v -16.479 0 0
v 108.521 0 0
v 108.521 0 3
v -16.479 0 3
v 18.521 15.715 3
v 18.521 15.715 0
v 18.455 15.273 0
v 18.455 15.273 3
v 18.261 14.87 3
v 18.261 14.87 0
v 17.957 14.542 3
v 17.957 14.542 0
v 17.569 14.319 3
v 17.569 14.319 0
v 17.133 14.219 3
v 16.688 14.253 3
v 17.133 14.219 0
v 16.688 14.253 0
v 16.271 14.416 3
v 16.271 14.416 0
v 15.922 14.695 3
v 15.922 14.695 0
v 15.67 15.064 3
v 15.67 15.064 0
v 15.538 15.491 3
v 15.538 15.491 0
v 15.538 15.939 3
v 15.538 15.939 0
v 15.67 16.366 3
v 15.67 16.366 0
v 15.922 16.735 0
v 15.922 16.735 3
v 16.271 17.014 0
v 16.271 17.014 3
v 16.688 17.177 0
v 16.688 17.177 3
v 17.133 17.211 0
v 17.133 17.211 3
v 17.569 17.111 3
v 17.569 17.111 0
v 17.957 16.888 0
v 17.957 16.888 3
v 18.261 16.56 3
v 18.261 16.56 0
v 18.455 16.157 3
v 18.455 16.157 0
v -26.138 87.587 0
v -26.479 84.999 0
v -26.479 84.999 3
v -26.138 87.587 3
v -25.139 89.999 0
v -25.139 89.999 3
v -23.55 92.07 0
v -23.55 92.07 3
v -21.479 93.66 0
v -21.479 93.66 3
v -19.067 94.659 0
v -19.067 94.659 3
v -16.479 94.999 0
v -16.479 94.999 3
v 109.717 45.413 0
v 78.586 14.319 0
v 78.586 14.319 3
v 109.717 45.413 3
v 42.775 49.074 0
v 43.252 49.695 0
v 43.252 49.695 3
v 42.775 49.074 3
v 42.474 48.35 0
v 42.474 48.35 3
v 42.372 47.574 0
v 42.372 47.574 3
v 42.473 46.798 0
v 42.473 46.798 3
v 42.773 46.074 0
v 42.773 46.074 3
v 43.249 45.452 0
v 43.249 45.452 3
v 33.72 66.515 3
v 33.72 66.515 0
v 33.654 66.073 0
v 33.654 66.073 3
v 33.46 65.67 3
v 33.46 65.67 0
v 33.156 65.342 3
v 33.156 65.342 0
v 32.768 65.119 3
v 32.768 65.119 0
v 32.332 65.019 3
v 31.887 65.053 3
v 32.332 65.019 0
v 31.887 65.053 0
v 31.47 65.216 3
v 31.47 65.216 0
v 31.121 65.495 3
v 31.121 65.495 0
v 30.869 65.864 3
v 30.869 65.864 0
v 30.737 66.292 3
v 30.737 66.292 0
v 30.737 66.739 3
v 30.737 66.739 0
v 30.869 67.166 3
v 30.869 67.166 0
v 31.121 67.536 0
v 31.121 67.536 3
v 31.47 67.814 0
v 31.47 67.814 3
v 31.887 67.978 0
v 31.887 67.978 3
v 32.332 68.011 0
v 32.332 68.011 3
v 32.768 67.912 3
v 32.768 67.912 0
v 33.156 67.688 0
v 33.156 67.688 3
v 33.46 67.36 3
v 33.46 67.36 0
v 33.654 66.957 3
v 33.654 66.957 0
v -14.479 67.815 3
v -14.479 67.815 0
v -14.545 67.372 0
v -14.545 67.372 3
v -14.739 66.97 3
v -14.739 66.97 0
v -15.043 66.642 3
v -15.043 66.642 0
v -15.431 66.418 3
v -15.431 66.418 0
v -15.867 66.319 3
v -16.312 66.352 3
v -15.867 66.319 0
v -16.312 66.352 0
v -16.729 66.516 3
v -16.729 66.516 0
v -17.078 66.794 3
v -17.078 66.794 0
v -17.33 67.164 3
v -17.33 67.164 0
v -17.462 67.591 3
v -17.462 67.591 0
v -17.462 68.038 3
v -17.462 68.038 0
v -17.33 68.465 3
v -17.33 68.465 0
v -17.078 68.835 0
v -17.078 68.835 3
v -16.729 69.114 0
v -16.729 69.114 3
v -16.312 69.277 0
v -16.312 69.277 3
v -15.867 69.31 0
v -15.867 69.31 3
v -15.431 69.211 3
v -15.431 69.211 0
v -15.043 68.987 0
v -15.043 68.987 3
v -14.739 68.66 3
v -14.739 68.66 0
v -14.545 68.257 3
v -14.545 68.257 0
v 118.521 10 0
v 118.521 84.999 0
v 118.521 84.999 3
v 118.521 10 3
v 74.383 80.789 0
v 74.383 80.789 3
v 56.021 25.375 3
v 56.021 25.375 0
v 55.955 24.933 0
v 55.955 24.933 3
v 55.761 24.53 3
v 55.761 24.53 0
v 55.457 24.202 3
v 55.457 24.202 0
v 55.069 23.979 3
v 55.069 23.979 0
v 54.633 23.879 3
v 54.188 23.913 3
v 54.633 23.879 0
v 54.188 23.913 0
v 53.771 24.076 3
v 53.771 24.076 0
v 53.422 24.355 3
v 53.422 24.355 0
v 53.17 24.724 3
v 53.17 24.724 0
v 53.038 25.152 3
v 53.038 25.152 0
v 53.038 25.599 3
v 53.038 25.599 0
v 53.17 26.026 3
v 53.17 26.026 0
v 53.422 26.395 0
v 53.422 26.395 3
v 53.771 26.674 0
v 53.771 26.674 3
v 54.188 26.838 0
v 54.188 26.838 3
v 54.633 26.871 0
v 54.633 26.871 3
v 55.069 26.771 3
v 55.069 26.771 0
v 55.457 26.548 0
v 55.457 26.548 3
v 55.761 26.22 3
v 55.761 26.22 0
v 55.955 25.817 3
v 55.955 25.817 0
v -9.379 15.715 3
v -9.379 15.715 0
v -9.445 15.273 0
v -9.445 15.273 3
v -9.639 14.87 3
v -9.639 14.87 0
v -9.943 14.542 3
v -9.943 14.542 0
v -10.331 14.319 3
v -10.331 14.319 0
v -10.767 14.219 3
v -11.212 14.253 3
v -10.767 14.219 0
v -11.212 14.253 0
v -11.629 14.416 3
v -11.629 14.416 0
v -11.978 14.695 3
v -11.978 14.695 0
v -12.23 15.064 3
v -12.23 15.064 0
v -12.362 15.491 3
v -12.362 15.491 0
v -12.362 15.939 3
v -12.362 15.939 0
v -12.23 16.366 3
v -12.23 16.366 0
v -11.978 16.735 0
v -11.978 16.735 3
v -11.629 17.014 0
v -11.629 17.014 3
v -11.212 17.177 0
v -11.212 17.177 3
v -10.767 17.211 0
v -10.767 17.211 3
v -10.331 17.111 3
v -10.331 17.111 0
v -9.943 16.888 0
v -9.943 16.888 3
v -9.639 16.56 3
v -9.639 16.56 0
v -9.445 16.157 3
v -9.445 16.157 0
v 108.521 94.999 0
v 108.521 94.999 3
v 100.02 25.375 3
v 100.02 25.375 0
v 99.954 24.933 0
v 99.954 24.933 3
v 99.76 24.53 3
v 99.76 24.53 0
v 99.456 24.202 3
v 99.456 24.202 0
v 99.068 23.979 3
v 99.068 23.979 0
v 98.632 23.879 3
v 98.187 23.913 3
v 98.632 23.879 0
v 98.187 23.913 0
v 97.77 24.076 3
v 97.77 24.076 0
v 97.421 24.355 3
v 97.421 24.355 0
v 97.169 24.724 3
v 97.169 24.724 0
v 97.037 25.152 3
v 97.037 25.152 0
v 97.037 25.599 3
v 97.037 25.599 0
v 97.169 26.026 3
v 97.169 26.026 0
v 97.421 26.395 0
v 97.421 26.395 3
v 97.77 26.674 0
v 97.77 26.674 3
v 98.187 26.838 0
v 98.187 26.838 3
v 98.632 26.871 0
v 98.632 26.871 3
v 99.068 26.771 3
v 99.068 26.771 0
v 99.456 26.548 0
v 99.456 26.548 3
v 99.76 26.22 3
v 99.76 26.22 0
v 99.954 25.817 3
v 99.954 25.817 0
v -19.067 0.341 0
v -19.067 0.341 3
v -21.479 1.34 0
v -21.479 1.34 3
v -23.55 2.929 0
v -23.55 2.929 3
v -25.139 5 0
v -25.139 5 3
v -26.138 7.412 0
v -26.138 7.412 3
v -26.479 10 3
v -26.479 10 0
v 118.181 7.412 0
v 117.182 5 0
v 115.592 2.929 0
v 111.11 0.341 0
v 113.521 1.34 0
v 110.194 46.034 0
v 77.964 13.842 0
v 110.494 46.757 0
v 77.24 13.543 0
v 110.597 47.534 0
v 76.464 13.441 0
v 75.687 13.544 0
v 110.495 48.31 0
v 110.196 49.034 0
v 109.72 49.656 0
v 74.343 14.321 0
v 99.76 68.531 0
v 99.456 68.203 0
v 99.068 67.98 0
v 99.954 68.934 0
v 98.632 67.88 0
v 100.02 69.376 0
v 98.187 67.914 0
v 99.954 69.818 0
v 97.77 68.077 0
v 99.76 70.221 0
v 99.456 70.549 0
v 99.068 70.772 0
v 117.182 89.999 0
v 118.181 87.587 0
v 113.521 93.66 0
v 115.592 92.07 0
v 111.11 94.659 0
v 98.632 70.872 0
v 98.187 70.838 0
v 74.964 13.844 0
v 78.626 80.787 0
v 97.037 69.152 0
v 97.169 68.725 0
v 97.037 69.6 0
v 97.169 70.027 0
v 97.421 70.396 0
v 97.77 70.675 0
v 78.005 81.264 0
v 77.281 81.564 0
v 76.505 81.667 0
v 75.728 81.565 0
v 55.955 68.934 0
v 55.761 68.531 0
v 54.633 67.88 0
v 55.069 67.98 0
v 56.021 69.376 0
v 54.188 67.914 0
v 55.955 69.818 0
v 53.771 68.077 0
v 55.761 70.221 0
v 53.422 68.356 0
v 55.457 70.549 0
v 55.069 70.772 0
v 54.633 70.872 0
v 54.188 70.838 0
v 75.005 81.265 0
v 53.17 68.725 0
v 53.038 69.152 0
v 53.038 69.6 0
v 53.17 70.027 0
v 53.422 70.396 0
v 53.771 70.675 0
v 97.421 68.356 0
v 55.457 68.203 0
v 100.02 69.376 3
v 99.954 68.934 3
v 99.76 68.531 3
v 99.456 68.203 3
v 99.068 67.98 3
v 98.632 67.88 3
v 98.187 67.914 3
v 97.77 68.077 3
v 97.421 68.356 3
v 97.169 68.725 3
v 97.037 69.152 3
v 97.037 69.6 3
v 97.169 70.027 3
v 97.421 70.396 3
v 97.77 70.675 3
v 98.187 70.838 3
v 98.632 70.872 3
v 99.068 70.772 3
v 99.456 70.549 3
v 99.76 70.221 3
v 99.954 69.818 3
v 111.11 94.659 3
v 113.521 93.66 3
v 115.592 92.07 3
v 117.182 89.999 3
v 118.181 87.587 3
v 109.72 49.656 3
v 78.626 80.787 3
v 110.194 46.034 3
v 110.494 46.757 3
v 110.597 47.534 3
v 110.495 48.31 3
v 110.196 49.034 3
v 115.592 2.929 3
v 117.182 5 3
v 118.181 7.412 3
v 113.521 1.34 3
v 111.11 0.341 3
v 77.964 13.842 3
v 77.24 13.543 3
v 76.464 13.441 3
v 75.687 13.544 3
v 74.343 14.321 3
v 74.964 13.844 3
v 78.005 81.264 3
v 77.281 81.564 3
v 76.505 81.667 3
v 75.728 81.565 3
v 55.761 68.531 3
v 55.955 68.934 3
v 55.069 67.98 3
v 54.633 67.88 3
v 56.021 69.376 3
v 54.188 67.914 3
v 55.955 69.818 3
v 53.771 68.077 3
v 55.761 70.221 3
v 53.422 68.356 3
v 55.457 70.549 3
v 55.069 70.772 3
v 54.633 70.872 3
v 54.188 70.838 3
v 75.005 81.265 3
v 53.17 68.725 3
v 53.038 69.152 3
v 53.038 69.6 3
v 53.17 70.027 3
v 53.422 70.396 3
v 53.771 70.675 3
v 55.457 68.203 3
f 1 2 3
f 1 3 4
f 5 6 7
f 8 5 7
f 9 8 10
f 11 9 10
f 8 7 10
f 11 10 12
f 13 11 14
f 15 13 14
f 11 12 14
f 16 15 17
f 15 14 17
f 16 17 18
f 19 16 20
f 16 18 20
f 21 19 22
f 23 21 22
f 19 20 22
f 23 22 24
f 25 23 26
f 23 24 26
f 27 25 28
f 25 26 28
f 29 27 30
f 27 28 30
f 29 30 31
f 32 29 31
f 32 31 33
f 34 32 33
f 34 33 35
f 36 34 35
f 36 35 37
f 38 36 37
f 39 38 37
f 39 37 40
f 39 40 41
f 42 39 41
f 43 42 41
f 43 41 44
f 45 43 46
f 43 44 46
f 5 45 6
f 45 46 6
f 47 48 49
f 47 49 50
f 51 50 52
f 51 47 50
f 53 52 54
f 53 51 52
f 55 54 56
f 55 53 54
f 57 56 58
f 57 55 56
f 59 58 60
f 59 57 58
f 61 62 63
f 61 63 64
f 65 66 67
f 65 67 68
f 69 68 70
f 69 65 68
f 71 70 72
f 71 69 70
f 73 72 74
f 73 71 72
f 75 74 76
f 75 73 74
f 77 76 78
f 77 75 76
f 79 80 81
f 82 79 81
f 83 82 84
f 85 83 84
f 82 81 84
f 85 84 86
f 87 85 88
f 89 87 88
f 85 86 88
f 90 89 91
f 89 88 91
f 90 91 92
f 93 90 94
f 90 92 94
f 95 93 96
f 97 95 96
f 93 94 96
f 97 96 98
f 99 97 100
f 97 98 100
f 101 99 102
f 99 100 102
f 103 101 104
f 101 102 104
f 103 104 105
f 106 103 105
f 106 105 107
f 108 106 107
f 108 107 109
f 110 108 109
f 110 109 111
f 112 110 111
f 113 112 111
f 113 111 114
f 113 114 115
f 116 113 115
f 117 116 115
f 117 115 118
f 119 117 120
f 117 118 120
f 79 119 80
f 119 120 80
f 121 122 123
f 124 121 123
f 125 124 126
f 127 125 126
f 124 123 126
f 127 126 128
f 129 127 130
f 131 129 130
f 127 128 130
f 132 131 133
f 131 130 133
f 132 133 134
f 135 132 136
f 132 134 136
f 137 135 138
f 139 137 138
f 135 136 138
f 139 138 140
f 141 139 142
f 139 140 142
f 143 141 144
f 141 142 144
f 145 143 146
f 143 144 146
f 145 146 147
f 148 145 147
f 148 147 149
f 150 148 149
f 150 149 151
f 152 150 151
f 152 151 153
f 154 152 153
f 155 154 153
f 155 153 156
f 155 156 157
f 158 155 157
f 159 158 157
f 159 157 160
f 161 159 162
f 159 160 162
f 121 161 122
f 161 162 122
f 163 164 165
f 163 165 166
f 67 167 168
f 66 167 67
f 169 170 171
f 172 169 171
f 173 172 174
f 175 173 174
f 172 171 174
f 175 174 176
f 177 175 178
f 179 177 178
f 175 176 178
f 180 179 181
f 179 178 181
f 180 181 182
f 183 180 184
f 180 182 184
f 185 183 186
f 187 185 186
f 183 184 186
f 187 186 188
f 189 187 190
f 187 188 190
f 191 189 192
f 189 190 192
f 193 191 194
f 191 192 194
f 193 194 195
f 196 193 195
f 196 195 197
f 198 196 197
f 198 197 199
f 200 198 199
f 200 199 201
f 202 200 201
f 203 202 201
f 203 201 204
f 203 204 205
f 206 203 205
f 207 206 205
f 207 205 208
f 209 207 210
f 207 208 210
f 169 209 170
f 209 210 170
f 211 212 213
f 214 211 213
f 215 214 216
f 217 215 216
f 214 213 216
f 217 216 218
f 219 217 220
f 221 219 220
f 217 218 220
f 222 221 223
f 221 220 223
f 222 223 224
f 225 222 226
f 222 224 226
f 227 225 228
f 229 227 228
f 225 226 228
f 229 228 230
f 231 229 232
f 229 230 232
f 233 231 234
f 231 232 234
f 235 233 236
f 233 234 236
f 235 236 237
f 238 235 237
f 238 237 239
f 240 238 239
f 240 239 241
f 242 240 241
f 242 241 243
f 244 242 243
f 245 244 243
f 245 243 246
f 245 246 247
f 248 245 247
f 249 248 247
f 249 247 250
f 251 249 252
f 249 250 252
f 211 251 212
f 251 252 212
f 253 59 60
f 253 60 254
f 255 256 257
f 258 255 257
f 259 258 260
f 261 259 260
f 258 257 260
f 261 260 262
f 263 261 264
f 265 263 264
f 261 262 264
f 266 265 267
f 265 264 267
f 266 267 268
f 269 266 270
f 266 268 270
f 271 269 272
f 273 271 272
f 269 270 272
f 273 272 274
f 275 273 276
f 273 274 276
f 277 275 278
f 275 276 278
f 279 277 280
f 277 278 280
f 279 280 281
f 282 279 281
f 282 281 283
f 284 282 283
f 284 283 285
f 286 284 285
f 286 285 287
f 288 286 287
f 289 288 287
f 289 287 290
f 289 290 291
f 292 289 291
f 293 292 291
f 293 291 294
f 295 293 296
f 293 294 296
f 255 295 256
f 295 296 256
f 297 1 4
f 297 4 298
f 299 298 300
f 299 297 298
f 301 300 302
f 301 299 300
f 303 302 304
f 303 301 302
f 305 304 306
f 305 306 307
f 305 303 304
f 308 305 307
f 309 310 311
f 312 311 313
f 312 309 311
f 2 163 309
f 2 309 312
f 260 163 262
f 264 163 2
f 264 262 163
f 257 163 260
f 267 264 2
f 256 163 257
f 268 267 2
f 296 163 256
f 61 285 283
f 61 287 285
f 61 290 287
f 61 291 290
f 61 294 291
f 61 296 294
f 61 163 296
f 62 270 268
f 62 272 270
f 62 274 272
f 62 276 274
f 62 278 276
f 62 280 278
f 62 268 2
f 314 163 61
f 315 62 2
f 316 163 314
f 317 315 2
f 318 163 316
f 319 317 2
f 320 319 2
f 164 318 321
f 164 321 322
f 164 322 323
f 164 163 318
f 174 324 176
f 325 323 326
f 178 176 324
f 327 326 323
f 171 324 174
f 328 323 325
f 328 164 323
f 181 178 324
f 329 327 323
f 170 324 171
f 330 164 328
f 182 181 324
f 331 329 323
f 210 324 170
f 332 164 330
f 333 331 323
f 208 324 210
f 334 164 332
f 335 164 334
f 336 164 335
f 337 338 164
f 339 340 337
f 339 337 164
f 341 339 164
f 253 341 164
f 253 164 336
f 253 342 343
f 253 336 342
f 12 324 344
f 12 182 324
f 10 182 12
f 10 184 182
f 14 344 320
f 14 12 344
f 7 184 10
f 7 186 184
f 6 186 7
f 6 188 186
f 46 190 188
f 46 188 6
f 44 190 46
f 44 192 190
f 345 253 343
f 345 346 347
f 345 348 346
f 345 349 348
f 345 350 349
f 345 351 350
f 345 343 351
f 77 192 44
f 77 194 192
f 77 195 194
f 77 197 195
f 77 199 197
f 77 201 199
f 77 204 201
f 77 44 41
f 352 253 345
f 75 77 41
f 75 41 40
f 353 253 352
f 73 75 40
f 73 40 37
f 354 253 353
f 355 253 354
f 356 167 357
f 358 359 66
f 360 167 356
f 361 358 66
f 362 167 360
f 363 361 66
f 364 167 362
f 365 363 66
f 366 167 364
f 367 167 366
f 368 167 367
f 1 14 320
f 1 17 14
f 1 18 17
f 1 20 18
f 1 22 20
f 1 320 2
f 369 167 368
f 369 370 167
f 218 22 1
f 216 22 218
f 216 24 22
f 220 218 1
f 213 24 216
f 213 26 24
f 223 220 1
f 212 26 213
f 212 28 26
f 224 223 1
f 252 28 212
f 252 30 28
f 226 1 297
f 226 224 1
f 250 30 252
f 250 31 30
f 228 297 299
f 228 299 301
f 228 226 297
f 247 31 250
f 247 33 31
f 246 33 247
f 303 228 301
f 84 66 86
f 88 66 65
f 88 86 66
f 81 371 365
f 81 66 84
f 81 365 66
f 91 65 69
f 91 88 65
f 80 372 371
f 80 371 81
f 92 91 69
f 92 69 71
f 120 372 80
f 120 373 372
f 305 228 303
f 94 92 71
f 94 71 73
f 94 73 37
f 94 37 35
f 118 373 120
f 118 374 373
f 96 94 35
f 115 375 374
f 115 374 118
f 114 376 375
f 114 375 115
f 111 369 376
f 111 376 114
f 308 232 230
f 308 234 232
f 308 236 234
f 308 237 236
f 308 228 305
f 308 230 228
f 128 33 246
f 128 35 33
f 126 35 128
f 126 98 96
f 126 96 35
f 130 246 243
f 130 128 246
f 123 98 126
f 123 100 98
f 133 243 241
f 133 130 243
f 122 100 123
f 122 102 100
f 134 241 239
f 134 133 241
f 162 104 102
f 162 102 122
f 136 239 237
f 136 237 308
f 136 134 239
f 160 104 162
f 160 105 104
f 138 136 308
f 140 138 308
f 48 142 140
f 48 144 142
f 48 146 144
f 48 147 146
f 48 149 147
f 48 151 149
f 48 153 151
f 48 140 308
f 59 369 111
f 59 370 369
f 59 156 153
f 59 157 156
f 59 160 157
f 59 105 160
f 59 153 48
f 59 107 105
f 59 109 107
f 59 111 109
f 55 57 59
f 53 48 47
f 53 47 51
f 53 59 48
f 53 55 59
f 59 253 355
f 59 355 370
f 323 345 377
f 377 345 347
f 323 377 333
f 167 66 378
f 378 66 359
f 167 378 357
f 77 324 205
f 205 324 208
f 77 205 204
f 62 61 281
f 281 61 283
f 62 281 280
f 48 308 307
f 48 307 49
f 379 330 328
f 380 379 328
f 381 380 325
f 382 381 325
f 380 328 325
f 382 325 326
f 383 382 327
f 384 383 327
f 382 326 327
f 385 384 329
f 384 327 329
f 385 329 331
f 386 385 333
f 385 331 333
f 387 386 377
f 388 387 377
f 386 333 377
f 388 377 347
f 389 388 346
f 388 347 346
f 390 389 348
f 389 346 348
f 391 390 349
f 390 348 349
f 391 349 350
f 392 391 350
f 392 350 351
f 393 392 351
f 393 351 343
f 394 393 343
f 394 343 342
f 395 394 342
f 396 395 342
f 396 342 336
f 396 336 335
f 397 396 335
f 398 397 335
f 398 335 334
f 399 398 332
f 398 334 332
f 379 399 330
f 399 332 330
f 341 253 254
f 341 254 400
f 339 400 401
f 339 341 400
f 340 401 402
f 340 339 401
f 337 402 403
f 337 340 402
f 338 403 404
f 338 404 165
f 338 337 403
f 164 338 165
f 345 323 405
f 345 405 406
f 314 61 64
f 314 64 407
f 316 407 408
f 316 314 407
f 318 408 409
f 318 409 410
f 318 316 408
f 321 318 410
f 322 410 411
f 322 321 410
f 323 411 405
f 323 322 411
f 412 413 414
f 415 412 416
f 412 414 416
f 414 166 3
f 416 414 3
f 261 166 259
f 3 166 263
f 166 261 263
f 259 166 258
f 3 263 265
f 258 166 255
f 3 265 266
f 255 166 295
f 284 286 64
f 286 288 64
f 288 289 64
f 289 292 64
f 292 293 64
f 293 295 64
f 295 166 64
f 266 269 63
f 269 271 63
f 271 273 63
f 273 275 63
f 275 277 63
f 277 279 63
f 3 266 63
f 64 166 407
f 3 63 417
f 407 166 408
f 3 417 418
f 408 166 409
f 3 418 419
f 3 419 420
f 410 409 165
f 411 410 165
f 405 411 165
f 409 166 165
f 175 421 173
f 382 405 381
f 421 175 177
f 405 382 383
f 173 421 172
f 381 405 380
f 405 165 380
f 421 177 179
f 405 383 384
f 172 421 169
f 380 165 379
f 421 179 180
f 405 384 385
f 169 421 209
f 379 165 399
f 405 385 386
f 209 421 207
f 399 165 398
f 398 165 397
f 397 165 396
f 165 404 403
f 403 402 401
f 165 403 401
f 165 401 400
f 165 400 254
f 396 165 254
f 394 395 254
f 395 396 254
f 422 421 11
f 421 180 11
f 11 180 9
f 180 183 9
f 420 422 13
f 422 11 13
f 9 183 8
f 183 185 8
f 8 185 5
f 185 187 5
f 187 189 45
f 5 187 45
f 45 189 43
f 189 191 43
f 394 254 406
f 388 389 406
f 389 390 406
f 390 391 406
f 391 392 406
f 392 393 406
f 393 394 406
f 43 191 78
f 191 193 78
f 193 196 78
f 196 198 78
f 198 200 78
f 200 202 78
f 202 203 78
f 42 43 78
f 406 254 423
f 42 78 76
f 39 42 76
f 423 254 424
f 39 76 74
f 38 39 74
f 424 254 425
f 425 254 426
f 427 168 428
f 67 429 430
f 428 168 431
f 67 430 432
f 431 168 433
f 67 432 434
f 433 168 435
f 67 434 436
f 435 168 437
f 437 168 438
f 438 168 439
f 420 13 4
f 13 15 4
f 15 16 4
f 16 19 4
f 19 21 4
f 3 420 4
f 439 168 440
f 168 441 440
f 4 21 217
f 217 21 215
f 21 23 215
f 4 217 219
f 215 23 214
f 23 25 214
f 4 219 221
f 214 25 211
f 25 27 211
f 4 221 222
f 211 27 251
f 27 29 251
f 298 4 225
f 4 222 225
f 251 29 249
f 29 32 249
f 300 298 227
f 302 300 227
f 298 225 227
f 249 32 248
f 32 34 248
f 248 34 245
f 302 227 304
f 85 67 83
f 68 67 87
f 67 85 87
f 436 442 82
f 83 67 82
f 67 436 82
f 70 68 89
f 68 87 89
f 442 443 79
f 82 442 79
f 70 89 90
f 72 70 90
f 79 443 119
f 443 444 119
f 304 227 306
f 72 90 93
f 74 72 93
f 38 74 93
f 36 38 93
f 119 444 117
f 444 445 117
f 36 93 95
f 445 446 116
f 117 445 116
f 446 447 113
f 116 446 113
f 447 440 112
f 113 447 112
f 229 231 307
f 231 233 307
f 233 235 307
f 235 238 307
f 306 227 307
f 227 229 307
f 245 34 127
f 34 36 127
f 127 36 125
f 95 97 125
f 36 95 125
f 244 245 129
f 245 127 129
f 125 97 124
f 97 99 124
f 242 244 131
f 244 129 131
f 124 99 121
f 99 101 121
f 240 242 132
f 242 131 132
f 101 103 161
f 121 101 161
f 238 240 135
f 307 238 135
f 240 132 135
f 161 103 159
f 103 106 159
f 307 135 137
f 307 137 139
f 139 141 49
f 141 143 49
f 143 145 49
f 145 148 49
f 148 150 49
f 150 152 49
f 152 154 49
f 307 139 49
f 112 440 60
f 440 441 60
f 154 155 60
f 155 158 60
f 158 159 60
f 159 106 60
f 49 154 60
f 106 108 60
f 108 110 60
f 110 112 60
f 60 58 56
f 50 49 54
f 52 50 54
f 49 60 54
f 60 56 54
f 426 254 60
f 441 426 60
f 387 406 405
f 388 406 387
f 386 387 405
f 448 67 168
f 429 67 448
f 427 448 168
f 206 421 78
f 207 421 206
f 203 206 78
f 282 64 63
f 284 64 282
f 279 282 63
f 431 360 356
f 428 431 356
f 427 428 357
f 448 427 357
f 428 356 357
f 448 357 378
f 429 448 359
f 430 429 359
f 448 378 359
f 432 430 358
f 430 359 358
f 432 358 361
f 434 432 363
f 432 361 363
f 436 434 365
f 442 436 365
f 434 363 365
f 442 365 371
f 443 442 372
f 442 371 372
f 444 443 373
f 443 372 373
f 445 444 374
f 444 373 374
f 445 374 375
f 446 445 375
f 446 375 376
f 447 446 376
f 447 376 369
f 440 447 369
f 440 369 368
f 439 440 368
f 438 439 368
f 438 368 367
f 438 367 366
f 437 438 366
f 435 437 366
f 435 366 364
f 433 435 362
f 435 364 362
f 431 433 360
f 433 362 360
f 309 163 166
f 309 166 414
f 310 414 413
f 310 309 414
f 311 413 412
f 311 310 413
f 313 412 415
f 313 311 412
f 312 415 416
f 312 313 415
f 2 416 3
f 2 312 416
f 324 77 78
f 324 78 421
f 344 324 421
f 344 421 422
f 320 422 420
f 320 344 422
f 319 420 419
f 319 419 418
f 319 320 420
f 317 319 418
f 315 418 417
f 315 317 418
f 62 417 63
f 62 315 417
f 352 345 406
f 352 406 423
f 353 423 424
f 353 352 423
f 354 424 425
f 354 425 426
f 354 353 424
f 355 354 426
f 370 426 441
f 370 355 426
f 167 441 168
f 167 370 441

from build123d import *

# Parameters (mm, degrees)
SKETCH_1_R      = 1.5
EXTRUDE_1_DEPTH = 3


with BuildPart() as part:
    # 草图1 → 凸台-拉伸1 (new body)
    with BuildSketch(Plane(origin=(0, 0, 0), x_dir=(-1, 0, 0), z_dir=(0, 0, -1))):
        with BuildLine():
            Line((-108.521309774, 0), (16.478690226, 0))
            ThreePointArc((16.478690226, 0), (23.549758037, 2.928932188), (26.478690226, 10))
            Line((26.478690226, 10), (26.478690226, 84.99928))
            ThreePointArc((26.478690226, 84.99928), (23.549758037, 92.070347812), (16.478690226, 94.99928))
            Line((16.478690226, 94.99928), (-108.521309774, 94.99928))
            ThreePointArc((-108.521309774, 94.99928), (-115.592377586, 92.070347812), (-118.521309774, 84.99928))
            Line((-118.521309774, 84.99928), (-118.521309774, 10))
            ThreePointArc((-118.521309774, 10), (-115.592377586, 2.928932188), (-108.521309774, 0))
        make_face()
        with Locations(Location((15.978690226, 67.81454533, 0), (0, 0, 180))):
            Circle(SKETCH_1_R, mode=Mode.SUBTRACT)
        with Locations(Location((-32.220309774, 66.51524533, 0), (0, 0, 180))):
            Circle(SKETCH_1_R, mode=Mode.SUBTRACT)
        with Locations(Location((10.878690226, 15.71504533, 0), (0, 0, 180))):
            Circle(SKETCH_1_R, mode=Mode.SUBTRACT)
        with Locations(Location((-54.521309774, 69.37594533, 0), (0, 0, 180))):
            Circle(SKETCH_1_R, mode=Mode.SUBTRACT)
        with Locations(Location((-98.520309774, 69.37594533, 0), (0, 0, 180))):
            Circle(SKETCH_1_R, mode=Mode.SUBTRACT)
        with Locations(Location((-98.520309774, 25.37514533, 0), (0, 0, 180))):
            Circle(SKETCH_1_R, mode=Mode.SUBTRACT)
        with Locations(Location((-54.521309774, 25.37514533, 0), (0, 0, 180))):
            Circle(SKETCH_1_R, mode=Mode.SUBTRACT)
        with Locations(Location((-17.021309774, 15.71504533, 0), (0, 0, 180))):
            Circle(SKETCH_1_R, mode=Mode.SUBTRACT)
        with BuildLine():
            Line((-109.719554185, 49.655521805), (-78.625612362, 80.786563559))
            ThreePointArc((-78.625612362, 80.786563559), (-76.504816284, 81.666507838), (-74.382972429, 80.789093116))
            Line((-74.382972429, 80.789093116), (-43.251668672, 49.694889603))
            ThreePointArc((-43.251668672, 49.694889603), (-42.371724394, 47.574093524), (-43.249139115, 45.452249669))
            Line((-43.249139115, 45.452249669), (-74.343080939, 14.321207916))
            ThreePointArc((-74.343080939, 14.321207916), (-76.463877017, 13.441263637), (-78.585720872, 14.318678358))
            Line((-78.585720872, 14.318678358), (-109.717024628, 45.412881872))
            ThreePointArc((-109.717024628, 45.412881872), (-110.596968907, 47.53367795), (-109.719554185, 49.655521805))
        make_face(mode=Mode.SUBTRACT)
    extrude(amount=-EXTRUDE_1_DEPTH)


solid = part.part
